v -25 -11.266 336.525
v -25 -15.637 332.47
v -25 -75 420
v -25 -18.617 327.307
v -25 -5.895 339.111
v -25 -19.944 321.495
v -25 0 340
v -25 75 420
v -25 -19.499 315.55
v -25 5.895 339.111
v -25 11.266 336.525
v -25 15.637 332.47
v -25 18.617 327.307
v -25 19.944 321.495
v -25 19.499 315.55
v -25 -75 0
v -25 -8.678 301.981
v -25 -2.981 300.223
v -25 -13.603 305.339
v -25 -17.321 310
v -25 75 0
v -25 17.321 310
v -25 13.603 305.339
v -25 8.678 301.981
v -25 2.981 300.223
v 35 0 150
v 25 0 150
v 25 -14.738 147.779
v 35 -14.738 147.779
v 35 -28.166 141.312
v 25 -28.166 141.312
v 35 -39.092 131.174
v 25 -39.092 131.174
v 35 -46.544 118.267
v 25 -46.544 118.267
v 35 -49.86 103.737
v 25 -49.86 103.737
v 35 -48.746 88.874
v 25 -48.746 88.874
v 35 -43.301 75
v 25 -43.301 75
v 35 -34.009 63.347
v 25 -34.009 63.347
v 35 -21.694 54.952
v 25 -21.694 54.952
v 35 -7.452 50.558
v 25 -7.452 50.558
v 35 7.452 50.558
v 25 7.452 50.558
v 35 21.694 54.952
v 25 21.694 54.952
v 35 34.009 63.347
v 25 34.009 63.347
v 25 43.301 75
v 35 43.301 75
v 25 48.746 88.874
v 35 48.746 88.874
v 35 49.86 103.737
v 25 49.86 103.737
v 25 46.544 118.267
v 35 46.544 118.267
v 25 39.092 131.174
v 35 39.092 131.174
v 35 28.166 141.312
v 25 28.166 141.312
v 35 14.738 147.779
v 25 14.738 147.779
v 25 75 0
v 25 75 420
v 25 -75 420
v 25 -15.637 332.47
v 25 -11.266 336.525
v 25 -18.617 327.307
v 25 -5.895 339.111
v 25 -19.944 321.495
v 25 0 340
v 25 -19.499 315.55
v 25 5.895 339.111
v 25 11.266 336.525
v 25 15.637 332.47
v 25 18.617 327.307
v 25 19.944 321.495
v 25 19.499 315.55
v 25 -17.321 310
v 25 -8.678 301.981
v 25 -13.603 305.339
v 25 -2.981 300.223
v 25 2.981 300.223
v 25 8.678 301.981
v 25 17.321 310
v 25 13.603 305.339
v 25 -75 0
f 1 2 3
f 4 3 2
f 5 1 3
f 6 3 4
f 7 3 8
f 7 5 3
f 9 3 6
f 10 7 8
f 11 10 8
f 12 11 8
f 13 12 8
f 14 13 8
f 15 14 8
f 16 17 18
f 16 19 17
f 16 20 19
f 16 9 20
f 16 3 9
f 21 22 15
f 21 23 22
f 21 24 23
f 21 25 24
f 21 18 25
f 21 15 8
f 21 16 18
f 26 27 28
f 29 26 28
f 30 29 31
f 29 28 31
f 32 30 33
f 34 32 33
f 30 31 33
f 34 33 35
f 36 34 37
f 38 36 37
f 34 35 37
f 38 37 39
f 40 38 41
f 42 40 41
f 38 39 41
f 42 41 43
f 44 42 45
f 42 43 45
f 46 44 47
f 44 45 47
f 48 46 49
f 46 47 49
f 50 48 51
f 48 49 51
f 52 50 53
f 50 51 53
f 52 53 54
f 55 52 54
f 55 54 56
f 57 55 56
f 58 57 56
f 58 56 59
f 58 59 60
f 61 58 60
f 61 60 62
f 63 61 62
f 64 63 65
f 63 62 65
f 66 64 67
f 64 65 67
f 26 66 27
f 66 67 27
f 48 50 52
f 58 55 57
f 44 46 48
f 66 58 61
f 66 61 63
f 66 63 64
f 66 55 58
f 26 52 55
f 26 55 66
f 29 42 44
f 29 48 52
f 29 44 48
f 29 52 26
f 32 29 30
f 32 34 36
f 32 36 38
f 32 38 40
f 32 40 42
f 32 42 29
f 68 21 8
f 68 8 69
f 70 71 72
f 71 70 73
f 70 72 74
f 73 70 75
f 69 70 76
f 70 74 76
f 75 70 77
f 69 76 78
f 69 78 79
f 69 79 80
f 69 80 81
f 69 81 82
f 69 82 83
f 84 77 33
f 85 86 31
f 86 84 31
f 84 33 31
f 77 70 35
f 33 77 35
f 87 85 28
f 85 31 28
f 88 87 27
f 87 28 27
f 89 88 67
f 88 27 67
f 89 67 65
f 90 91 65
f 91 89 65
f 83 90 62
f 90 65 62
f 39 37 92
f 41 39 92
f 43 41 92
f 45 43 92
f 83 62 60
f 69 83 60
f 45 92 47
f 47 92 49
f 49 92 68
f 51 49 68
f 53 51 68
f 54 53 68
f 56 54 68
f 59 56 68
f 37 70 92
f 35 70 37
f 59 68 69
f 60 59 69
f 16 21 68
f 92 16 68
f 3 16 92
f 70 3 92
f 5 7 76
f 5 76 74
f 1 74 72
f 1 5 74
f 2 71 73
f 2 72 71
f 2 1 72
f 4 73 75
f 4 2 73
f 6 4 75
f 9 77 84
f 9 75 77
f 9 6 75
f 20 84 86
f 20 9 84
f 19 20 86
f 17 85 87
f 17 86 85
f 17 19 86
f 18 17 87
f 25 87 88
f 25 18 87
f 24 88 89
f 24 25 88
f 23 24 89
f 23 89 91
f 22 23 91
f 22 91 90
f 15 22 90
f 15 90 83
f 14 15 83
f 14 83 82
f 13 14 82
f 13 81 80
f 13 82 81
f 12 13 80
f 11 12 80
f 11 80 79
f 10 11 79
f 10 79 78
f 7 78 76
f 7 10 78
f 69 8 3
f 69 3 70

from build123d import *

# Parameters (mm, degrees)
SKETCH1_W               = 50
SKETCH1_H               = 150
BOSS_EXTRUDE1_DEPTH     = 420
CUT_EXTRUDE1_DEPTH      = 400
CUT_EXTRUDE1_DEPTH_BACK = 400
SKETCH2_R               = 20
SKETCH3_R               = 50
BOSS_EXTRUDE2_DEPTH     = 10


with BuildPart() as part:
    # Sketch1 → Boss-Extrude1 (new body)
    with BuildSketch(Plane.XY):
        Rectangle(SKETCH1_W, SKETCH1_H)
    extrude(amount=BOSS_EXTRUDE1_DEPTH)

    # Sketch2 → Cut-Extrude1 (cut, two sides: drawn at the far end of the back side and taken through both)
    with BuildSketch(Plane(origin=(25, 0, 0), x_dir=(0, 0, -1), z_dir=(1, 0, 0)).offset(-CUT_EXTRUDE1_DEPTH_BACK)):
        with Locations((-320, 0)):
            Circle(SKETCH2_R)
    extrude(amount=CUT_EXTRUDE1_DEPTH + CUT_EXTRUDE1_DEPTH_BACK, mode=Mode.SUBTRACT)

    # Sketch3 → Boss-Extrude2 (add)
    with BuildSketch(Plane(origin=(25, 0, 0), x_dir=(0, 0, -1), z_dir=(1, 0, 0))):
        with Locations((-100, 0)):
            Circle(SKETCH3_R)
    extrude(amount=BOSS_EXTRUDE2_DEPTH)


solid = part.part
